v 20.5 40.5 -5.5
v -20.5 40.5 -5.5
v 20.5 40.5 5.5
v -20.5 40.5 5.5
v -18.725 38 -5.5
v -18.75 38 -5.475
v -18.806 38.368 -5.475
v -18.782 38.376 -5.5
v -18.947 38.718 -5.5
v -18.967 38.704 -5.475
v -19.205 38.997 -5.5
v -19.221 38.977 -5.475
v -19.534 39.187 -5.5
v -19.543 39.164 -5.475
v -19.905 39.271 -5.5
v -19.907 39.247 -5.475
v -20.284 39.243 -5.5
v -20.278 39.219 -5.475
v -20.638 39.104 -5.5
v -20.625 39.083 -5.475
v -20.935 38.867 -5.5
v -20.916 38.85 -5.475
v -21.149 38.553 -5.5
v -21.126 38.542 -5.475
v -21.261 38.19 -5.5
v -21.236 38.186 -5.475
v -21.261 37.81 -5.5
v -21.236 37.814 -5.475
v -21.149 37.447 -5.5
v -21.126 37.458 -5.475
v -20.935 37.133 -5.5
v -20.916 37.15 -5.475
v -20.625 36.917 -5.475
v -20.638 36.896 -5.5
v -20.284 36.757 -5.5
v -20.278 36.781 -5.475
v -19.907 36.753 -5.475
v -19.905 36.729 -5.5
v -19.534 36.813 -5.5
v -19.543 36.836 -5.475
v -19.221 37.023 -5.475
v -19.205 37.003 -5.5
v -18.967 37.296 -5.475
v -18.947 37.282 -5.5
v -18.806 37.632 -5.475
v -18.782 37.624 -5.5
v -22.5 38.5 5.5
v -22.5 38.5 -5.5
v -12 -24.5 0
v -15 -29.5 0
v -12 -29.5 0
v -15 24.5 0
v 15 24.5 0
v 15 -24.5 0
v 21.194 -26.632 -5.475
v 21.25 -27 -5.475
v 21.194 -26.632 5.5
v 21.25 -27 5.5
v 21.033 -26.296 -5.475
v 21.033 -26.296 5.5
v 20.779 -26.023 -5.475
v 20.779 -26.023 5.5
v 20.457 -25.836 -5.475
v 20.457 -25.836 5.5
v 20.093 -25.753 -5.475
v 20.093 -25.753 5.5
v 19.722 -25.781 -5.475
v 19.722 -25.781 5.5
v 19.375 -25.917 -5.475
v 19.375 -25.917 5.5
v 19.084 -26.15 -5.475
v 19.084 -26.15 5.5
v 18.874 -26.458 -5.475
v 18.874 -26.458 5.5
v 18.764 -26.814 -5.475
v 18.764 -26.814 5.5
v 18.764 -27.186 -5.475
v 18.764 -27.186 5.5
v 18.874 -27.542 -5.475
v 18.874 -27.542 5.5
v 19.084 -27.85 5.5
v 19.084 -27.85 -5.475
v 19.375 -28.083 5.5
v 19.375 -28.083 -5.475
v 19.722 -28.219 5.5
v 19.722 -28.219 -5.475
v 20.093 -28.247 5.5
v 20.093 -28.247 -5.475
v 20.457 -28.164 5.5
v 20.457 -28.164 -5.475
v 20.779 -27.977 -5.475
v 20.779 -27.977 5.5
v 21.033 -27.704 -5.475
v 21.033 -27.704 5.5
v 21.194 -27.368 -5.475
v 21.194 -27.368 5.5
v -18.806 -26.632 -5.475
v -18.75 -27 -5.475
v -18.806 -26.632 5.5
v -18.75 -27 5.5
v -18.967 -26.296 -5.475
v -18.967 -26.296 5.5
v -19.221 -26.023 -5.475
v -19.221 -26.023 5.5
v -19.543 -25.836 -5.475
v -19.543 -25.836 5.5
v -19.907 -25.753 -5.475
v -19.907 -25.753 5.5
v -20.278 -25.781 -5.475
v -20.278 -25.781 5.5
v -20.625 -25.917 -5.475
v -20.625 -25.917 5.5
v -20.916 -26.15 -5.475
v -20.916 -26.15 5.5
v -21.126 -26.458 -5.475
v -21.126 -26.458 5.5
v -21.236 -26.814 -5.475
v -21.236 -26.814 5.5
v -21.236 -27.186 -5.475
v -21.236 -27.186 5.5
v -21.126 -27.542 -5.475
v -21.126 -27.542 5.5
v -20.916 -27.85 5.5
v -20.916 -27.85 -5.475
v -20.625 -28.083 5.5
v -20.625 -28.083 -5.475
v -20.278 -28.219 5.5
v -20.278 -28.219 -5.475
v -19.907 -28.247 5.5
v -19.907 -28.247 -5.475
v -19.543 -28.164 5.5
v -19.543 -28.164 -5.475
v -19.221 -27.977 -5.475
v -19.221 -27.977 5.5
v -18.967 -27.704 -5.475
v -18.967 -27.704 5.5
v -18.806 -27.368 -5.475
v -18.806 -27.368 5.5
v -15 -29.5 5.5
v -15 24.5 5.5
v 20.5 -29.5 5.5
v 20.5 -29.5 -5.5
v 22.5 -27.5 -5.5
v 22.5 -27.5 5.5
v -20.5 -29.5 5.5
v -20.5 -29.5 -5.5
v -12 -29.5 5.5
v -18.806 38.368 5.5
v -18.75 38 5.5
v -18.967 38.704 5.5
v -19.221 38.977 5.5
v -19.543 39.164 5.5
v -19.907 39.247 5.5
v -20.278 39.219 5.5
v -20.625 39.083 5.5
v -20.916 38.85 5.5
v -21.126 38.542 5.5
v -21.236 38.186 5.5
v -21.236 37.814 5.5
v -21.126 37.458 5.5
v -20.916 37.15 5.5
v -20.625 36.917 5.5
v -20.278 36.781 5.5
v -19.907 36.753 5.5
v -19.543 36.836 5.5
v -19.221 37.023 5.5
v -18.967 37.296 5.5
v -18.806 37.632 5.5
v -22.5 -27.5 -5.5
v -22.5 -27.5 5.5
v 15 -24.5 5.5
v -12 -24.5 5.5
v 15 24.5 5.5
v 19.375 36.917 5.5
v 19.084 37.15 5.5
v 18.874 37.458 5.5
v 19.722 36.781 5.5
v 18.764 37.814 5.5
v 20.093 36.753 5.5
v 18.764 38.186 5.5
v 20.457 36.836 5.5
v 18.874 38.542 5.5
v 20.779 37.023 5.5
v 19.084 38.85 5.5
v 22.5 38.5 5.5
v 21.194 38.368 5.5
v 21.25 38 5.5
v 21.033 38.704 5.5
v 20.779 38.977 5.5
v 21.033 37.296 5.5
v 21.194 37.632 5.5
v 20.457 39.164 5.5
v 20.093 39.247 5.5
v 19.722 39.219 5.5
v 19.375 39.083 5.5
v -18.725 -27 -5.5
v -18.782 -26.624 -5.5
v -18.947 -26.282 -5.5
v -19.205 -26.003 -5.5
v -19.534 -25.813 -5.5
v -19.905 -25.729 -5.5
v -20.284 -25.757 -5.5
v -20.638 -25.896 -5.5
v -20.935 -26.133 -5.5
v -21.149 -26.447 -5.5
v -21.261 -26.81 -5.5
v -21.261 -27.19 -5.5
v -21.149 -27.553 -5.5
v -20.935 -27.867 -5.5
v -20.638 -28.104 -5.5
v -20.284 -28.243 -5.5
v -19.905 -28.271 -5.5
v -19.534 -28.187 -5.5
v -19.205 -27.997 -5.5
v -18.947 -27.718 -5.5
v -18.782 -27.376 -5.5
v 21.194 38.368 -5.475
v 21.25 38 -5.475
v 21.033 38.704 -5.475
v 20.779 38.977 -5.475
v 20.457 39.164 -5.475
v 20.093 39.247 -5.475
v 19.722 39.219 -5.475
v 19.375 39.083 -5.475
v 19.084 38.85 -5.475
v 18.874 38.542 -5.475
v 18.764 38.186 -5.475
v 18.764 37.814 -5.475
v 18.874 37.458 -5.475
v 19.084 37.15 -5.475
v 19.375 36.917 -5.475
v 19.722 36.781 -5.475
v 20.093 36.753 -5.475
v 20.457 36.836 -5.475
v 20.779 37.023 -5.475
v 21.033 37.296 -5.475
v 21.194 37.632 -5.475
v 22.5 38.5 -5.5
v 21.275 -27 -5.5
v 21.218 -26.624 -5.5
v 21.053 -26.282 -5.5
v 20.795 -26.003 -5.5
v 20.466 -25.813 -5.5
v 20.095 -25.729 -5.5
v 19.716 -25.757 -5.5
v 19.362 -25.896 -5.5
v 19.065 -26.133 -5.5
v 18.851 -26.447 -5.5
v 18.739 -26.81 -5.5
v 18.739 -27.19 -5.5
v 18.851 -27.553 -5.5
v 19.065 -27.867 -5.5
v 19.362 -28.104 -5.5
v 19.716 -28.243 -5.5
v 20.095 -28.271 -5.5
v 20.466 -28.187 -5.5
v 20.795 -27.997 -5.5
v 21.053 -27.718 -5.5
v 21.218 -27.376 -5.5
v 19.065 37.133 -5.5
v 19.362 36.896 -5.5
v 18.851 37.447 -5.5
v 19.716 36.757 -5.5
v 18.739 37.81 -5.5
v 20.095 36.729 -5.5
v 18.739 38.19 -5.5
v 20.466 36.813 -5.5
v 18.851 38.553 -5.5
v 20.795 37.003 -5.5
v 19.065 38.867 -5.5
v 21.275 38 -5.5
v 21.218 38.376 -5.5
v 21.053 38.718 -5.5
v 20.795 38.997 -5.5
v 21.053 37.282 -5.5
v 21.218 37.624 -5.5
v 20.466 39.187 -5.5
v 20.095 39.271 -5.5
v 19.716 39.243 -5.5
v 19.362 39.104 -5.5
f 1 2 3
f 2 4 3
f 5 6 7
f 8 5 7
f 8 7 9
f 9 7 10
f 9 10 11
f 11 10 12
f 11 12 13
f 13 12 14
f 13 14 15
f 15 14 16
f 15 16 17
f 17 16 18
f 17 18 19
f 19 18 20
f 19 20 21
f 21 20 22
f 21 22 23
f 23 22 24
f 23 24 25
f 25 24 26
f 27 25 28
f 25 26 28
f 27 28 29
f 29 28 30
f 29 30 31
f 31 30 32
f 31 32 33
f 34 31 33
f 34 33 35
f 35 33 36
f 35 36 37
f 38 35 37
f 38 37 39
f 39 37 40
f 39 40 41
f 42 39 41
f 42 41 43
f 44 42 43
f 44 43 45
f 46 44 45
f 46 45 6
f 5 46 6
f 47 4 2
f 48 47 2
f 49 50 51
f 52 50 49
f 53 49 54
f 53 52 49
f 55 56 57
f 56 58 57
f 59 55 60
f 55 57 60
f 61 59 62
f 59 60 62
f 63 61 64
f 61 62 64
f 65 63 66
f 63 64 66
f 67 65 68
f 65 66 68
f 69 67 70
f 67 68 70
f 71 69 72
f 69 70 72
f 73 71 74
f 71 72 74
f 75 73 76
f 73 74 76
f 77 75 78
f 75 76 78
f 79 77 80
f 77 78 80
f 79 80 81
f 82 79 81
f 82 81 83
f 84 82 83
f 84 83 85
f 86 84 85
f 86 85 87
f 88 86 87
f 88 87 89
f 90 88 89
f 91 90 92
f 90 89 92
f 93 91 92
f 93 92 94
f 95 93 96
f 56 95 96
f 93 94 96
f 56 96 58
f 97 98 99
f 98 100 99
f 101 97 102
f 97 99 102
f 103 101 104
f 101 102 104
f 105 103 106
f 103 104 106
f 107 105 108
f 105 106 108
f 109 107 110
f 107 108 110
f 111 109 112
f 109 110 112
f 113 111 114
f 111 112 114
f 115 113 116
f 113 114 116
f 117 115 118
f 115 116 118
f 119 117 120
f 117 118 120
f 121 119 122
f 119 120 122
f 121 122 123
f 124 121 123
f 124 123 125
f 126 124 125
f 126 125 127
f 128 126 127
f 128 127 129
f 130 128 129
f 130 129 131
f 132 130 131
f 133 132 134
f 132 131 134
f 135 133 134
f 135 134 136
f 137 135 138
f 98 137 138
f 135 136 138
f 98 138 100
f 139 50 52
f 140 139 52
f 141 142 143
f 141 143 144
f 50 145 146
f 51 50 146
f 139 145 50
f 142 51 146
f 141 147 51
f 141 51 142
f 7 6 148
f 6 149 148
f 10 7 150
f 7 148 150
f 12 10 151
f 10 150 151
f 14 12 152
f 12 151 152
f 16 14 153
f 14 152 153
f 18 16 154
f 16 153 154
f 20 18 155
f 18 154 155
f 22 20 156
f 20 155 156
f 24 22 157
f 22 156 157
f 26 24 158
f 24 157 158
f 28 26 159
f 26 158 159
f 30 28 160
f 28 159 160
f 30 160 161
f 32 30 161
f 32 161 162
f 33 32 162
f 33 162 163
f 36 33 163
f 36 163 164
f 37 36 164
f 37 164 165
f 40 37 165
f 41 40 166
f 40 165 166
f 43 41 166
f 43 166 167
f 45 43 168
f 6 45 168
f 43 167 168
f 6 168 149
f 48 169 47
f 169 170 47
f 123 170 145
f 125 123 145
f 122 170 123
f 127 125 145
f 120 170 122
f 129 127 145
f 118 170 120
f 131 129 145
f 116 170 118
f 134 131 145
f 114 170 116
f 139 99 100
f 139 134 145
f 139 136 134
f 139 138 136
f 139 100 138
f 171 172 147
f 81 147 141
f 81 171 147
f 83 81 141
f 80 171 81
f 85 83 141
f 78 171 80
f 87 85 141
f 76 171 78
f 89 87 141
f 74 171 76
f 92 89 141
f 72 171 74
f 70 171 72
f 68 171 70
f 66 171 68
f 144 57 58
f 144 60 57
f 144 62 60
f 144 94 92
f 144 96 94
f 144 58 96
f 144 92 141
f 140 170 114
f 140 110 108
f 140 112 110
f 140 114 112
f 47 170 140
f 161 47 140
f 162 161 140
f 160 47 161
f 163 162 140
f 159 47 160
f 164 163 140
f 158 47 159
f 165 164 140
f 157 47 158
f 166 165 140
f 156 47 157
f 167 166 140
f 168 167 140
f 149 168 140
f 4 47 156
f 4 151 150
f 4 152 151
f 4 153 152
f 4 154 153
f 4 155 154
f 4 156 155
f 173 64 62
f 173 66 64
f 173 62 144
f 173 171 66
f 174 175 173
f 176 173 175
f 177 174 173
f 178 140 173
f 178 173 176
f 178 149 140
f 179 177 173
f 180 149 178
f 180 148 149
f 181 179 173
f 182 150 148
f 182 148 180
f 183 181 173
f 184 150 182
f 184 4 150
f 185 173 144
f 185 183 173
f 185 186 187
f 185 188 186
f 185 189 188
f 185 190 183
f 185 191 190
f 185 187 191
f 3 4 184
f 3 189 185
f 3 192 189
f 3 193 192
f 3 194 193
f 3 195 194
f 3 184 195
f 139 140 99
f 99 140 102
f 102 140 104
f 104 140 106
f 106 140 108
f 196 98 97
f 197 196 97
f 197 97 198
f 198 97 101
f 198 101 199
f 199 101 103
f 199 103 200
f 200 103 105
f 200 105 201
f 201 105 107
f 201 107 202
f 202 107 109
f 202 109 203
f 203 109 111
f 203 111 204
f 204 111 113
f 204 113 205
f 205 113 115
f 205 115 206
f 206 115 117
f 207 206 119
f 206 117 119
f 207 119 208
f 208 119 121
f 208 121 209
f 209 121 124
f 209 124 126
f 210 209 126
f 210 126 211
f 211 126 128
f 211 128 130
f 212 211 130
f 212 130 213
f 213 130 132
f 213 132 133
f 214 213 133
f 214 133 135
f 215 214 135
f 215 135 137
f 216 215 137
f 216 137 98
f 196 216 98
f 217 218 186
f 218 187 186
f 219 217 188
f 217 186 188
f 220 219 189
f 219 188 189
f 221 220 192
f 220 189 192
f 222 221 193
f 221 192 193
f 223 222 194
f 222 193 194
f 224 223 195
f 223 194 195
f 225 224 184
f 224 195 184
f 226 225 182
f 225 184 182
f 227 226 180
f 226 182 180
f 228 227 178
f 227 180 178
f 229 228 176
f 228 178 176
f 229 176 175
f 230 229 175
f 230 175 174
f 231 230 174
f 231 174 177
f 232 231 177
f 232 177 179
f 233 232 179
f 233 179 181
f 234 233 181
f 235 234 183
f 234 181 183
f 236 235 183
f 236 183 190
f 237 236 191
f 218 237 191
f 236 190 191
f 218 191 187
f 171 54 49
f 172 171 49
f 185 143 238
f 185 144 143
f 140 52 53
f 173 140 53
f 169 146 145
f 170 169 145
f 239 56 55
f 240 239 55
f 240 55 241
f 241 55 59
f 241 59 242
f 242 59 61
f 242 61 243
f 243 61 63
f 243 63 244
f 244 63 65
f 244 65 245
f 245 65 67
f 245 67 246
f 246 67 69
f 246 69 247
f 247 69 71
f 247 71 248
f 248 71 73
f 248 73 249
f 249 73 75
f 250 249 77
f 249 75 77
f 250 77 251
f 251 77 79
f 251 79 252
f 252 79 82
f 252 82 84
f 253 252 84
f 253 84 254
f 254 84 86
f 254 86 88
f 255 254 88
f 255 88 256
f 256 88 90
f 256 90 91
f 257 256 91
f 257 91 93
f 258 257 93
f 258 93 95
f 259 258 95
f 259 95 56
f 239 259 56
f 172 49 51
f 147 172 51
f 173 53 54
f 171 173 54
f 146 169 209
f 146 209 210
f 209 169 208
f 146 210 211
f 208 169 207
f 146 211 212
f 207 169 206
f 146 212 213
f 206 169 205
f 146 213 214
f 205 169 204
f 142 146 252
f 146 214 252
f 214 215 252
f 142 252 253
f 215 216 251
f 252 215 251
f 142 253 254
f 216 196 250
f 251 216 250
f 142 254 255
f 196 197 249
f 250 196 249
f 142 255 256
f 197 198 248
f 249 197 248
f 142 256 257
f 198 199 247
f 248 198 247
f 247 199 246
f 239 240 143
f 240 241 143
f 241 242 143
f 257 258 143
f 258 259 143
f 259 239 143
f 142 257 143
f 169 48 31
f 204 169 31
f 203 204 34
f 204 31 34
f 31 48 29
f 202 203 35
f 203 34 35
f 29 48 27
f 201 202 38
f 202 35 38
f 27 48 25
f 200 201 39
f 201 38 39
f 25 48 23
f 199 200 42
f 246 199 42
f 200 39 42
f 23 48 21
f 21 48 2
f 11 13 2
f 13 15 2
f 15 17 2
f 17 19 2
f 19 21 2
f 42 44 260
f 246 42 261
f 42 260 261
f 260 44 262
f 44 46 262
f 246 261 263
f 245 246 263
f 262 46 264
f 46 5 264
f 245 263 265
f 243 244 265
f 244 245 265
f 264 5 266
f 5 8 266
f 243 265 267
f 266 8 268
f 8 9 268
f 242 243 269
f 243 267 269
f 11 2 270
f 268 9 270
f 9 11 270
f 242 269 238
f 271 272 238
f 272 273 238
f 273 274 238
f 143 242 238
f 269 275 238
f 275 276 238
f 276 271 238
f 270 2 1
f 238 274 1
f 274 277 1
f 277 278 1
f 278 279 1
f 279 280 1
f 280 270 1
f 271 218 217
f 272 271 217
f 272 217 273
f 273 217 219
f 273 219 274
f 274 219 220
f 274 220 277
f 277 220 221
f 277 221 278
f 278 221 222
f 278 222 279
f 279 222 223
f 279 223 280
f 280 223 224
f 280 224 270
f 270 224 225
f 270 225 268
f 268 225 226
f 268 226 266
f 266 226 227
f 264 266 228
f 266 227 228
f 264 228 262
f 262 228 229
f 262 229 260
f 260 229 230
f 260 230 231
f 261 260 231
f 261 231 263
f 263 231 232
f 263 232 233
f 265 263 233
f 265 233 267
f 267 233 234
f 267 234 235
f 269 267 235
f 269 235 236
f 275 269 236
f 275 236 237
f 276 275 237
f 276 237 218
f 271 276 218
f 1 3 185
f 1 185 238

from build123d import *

# Parameters (mm, degrees)
BOSS_EXTRUDE1_DEPTH               = 5.5
SKETCH1_3_W                       = 45
SKETCH1_3_H                       = 70
BOSS_EXTRUDE2_DEPTH               = 5.5
TAP_DRILL_FOR_M3_TAP1_D           = 2.5
TAP_DRILL_FOR_M3_TAP1_CSINK_D     = 2.55
TAP_DRILL_FOR_M3_TAP1_CSINK_ANGLE = 90
CHAMFER1_SIZE                     = 2


with BuildPart() as part:
    # Sketch1 → Boss-Extrude1 (new body)
    with BuildSketch(Plane.XY):
        Polygon((-12, -29.5), (22.5, -29.5), (22.5, 40.5), (-22.5, 40.5), (-22.5, -29.5), (-15, -29.5), (-15, -24.5), (-15, 24.5), (15, 24.5), (15, -24.5), (-12, -24.5), align=None)
    extrude(amount=BOSS_EXTRUDE1_DEPTH)

    # Sketch1<3> → Boss-Extrude2 (add)
    with BuildSketch(Plane.XY):
        with Locations((0, 5.5)):
            Rectangle(SKETCH1_3_W, SKETCH1_3_H)
    extrude(amount=-BOSS_EXTRUDE2_DEPTH)

    # Tap Drill for M3 Tap1 (through all)
    with Locations(Plane(origin=(0, 0, -5.5), x_dir=(-1, 0, 0), z_dir=(0, 0, -1))):
        with Locations((20, 38), (-20, 38), (-20, -27), (20, -27)):
            CounterSinkHole(TAP_DRILL_FOR_M3_TAP1_D / 2, TAP_DRILL_FOR_M3_TAP1_CSINK_D / 2, counter_sink_angle=TAP_DRILL_FOR_M3_TAP1_CSINK_ANGLE)

    # Chamfer1
    chamfer1_edges = [part.edges().sort_by_distance(p)[0] for p in [
        (-22.5, -29.5, 0),
        (-22.5, 40.5, 0),
        (22.5, 40.5, 0),
        (22.5, -29.5, 0),
    ]]
    chamfer(chamfer1_edges, length=CHAMFER1_SIZE)


solid = part.part
